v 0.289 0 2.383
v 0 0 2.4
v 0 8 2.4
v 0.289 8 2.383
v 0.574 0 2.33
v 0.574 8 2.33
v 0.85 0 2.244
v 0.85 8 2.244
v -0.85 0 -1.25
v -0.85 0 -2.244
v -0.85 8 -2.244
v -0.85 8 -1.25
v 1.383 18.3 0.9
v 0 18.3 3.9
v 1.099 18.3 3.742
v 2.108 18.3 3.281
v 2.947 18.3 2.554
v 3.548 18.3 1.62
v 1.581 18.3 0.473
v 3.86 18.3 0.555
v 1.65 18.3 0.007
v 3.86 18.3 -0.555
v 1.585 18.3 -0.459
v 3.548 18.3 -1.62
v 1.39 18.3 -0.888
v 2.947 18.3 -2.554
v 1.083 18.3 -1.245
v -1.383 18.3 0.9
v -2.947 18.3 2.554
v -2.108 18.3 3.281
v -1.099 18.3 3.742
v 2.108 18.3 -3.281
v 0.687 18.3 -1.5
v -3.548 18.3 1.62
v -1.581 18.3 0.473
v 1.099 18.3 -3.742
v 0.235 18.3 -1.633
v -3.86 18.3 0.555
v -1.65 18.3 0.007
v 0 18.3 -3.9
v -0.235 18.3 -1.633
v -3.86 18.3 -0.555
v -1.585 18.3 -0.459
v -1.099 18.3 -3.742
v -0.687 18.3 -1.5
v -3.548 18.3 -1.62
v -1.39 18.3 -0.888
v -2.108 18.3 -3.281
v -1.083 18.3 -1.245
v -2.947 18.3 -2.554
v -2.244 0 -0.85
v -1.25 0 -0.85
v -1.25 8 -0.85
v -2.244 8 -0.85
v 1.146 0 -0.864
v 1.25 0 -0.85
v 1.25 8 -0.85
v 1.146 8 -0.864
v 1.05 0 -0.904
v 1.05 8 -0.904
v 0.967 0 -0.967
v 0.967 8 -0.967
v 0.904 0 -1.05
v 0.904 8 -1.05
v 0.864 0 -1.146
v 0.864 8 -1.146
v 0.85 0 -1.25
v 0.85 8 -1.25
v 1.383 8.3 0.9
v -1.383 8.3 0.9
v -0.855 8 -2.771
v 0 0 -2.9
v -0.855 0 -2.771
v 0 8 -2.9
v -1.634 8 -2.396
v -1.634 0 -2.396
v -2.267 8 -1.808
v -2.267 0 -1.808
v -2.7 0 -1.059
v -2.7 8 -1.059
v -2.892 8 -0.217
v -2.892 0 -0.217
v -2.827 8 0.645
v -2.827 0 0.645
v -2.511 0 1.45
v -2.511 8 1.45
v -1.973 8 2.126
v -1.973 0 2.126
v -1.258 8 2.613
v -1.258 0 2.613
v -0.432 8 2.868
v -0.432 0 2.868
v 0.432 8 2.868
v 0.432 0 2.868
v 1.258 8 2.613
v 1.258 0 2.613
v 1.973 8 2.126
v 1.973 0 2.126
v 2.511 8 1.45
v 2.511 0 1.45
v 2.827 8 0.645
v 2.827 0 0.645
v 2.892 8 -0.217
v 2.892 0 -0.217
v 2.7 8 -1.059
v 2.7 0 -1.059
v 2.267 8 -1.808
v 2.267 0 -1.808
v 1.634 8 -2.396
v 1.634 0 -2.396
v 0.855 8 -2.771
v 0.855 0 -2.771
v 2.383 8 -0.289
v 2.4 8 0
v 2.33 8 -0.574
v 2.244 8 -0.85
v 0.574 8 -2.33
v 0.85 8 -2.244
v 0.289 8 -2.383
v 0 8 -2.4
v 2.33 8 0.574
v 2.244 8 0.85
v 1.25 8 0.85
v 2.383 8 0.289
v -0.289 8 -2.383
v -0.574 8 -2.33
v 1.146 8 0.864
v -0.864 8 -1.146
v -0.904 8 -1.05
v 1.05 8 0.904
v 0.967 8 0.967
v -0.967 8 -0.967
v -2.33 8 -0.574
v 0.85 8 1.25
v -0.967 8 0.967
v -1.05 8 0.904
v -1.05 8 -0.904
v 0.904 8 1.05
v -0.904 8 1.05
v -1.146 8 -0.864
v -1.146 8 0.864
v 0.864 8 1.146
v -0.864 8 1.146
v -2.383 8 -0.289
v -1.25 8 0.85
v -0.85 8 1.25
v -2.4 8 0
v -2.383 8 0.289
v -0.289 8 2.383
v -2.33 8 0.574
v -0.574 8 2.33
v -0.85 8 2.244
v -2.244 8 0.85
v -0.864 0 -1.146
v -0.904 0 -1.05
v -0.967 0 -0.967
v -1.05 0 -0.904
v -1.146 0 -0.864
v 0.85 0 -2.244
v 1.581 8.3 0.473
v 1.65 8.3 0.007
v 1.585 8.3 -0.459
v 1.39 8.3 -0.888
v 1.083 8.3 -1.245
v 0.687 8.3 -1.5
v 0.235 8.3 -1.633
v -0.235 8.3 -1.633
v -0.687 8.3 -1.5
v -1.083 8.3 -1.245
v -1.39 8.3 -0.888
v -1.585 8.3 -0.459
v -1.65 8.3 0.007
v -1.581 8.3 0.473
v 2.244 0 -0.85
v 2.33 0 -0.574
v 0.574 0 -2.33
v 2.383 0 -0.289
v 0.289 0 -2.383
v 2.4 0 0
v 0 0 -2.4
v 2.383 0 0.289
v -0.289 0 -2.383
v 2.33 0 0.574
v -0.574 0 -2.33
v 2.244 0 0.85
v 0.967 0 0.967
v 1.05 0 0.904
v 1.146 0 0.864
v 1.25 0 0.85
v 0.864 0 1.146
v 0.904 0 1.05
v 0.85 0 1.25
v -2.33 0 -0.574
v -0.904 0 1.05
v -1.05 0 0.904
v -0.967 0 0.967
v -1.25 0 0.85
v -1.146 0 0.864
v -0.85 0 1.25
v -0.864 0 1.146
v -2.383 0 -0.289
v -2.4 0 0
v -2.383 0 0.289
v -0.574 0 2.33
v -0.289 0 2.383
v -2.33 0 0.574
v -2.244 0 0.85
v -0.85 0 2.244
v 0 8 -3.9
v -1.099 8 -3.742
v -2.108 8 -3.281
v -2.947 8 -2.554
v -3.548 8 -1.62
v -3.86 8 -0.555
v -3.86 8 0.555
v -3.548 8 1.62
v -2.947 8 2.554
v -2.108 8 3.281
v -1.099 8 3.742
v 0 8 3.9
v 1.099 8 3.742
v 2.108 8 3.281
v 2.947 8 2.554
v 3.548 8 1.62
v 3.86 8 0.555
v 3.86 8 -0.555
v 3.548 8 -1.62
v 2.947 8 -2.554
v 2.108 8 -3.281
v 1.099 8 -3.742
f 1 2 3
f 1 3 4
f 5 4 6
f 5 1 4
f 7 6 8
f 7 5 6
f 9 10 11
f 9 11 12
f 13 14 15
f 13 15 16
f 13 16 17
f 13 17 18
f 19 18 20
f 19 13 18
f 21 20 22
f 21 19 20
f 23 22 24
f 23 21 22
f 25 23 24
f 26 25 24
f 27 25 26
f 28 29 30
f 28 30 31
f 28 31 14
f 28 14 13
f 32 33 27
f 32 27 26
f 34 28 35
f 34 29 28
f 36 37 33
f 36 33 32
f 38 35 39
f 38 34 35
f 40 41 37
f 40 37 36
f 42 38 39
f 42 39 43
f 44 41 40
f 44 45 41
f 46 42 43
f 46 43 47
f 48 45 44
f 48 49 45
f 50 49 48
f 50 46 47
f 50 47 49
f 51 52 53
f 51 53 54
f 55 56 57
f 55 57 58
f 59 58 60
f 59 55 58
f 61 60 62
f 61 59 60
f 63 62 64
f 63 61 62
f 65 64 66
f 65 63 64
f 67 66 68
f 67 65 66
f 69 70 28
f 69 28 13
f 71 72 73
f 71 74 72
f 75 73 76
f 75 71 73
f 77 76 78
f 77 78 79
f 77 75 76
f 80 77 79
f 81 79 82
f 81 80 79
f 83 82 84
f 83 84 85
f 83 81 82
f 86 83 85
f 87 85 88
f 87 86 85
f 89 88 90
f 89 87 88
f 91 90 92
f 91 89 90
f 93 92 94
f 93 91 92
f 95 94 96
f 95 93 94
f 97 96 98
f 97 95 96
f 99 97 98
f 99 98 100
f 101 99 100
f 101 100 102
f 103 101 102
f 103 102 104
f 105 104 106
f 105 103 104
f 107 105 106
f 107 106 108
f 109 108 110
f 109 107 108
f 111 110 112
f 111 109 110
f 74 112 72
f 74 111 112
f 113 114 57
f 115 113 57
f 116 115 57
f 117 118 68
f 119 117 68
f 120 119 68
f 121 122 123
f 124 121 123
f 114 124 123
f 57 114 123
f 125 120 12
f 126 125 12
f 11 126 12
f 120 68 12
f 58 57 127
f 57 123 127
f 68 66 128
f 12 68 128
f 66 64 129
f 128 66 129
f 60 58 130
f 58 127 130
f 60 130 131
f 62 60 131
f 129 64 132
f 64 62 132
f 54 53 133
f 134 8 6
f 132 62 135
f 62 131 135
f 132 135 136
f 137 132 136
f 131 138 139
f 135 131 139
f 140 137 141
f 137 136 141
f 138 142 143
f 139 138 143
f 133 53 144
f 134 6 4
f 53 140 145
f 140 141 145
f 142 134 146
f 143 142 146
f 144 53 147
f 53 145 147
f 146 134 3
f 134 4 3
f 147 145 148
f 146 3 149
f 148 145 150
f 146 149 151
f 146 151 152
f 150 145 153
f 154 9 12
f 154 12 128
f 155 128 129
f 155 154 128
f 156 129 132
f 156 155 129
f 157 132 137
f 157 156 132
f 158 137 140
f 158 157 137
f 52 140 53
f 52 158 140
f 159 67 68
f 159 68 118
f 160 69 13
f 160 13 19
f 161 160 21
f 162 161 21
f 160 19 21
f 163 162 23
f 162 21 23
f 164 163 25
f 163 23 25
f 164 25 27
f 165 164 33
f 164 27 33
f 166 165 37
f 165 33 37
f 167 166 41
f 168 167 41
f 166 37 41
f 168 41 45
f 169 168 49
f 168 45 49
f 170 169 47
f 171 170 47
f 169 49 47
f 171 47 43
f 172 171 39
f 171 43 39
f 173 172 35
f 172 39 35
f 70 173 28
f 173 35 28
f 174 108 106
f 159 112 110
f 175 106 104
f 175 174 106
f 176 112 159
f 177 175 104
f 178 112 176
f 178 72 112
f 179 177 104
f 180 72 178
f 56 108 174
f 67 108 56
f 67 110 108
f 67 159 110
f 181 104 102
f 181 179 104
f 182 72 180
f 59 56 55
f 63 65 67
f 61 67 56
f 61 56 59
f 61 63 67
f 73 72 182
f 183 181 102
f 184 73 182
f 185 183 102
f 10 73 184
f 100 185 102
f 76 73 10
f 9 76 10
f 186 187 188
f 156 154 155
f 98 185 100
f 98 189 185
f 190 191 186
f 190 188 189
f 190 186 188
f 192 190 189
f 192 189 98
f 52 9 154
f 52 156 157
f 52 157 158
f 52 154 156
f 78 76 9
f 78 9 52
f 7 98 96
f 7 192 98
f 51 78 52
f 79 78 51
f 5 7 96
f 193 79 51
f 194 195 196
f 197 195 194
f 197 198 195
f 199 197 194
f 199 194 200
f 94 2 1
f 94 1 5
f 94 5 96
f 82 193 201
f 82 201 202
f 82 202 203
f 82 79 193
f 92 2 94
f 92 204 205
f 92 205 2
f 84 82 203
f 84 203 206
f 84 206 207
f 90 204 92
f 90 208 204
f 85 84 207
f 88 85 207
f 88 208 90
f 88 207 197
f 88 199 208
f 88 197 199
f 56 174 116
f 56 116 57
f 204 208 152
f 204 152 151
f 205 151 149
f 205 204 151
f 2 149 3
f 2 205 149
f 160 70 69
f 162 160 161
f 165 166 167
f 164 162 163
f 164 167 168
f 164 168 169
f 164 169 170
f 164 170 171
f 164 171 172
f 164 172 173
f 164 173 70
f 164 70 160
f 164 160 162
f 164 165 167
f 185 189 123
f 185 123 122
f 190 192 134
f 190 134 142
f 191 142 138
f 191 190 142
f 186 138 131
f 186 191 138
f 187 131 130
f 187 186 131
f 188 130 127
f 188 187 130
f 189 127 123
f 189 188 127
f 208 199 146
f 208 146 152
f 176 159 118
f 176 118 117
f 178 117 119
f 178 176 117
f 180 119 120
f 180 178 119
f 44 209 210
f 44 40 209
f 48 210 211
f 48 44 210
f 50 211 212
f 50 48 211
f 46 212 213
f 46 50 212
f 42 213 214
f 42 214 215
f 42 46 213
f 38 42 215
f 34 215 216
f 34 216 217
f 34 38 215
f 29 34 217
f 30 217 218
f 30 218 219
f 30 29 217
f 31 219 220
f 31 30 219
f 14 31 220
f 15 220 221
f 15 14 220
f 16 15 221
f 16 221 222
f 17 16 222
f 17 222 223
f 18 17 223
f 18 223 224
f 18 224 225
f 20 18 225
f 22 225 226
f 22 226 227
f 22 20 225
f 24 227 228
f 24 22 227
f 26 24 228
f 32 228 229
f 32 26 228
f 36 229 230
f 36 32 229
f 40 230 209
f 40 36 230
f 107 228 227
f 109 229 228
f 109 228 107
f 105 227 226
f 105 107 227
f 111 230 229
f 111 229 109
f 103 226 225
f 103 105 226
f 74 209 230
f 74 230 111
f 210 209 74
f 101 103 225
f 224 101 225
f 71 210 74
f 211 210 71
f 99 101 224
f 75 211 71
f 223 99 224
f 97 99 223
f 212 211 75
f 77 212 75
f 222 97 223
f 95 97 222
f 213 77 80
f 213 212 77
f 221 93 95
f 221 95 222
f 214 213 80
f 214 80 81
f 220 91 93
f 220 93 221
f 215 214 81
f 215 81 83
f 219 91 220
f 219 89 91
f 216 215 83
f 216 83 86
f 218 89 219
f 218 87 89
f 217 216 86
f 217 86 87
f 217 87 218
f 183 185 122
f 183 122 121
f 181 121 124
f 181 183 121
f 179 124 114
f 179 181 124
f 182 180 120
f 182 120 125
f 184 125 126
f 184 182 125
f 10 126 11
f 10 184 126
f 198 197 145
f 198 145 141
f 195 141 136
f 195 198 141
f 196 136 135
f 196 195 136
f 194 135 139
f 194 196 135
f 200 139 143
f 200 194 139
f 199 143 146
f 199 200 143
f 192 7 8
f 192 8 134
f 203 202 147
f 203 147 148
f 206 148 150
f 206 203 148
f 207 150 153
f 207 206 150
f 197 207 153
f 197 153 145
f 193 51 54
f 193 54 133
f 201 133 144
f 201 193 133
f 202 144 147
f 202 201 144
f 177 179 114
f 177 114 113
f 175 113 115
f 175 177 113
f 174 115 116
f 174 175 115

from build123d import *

# Parameters (mm, degrees)
SCHNITT_LINEAR_AUSTRAGEN1_DEPTH = 8
SCHNITT_LINEAR_AUSTRAGEN2_DEPTH = 10


with BuildPart() as part:
    # Skizze1 → Rotation1 (revolve)
    with BuildSketch(Plane.XY, mode=Mode.PRIVATE) as rotation1_sk:
        Polygon((0, 0), (-2.9, 0), (-2.9, 8), (-3.9, 8), (-3.9, 18.3), (0, 18.3), align=None)
    revolve(rotation1_sk.sketch.rotate(Axis((0, 0, 0), (0, 1, 0)), 270), axis=Axis((0, 0, 0), (0, 1, 0)))

    # Skizze3 → Schnitt-Linear austragen1 (cut)
    with BuildSketch(Plane.XZ):
        with BuildLine():
            Line((0.85, 2.244437569), (0.85, 1.25))
            ThreePointArc((0.85, 1.25), (0.967157288, 0.967157288), (1.25, 0.85))
            Line((1.25, 0.85), (2.244437569, 0.85))
            ThreePointArc((2.244437569, 0.85), (2.36078908, 0.432058928), (2.4, 0))
            ThreePointArc((2.4, 0), (2.36078908, -0.432058928), (2.244437569, -0.85))
            Line((2.244437569, -0.85), (1.25, -0.85))
            ThreePointArc((1.25, -0.85), (0.967157288, -0.967157288), (0.85, -1.25))
            Line((0.85, -1.25), (0.85, -2.244437569))
            ThreePointArc((0.85, -2.244437569), (0.432058928, -2.36078908), (0, -2.4))
            ThreePointArc((0, -2.4), (-0.432058928, -2.36078908), (-0.85, -2.244437569))
            Line((-0.85, -2.244437569), (-0.85, -1.25))
            ThreePointArc((-0.85, -1.25), (-0.967157288, -0.967157288), (-1.25, -0.85))
            Line((-1.25, -0.85), (-2.244437569, -0.85))
            ThreePointArc((-2.244437569, -0.85), (-2.36078908, -0.432058928), (-2.4, 0))
            ThreePointArc((-2.4, 0), (-2.36078908, 0.432058928), (-2.244437569, 0.85))
            Line((-2.244437569, 0.85), (-1.25, 0.85))
            ThreePointArc((-1.25, 0.85), (-0.967157288, 0.967157288), (-0.85, 1.25))
            Line((-0.85, 1.25), (-0.85, 2.244437569))
            ThreePointArc((-0.85, 2.244437569), (-0.432058928, 2.36078908), (0, 2.4))
            ThreePointArc((0, 2.4), (0.432058928, 2.36078908), (0.85, 2.244437569))
        make_face()
    extrude(amount=-SCHNITT_LINEAR_AUSTRAGEN1_DEPTH, mode=Mode.SUBTRACT)

    # Skizze4 → Schnitt-Linear austragen2 (cut)
    with BuildSketch(Plane(origin=(0, 18.3, 0), x_dir=(1, 0, 0), z_dir=(0, 1, 0))):
        with BuildLine():
            Line((-1.382931669, -0.9), (1.382931669, -0.9))
            ThreePointArc((1.382931669, -0.9), (0, 1.65), (-1.382931669, -0.9))
        make_face()
    extrude(amount=-SCHNITT_LINEAR_AUSTRAGEN2_DEPTH, mode=Mode.SUBTRACT)


solid = part.part
